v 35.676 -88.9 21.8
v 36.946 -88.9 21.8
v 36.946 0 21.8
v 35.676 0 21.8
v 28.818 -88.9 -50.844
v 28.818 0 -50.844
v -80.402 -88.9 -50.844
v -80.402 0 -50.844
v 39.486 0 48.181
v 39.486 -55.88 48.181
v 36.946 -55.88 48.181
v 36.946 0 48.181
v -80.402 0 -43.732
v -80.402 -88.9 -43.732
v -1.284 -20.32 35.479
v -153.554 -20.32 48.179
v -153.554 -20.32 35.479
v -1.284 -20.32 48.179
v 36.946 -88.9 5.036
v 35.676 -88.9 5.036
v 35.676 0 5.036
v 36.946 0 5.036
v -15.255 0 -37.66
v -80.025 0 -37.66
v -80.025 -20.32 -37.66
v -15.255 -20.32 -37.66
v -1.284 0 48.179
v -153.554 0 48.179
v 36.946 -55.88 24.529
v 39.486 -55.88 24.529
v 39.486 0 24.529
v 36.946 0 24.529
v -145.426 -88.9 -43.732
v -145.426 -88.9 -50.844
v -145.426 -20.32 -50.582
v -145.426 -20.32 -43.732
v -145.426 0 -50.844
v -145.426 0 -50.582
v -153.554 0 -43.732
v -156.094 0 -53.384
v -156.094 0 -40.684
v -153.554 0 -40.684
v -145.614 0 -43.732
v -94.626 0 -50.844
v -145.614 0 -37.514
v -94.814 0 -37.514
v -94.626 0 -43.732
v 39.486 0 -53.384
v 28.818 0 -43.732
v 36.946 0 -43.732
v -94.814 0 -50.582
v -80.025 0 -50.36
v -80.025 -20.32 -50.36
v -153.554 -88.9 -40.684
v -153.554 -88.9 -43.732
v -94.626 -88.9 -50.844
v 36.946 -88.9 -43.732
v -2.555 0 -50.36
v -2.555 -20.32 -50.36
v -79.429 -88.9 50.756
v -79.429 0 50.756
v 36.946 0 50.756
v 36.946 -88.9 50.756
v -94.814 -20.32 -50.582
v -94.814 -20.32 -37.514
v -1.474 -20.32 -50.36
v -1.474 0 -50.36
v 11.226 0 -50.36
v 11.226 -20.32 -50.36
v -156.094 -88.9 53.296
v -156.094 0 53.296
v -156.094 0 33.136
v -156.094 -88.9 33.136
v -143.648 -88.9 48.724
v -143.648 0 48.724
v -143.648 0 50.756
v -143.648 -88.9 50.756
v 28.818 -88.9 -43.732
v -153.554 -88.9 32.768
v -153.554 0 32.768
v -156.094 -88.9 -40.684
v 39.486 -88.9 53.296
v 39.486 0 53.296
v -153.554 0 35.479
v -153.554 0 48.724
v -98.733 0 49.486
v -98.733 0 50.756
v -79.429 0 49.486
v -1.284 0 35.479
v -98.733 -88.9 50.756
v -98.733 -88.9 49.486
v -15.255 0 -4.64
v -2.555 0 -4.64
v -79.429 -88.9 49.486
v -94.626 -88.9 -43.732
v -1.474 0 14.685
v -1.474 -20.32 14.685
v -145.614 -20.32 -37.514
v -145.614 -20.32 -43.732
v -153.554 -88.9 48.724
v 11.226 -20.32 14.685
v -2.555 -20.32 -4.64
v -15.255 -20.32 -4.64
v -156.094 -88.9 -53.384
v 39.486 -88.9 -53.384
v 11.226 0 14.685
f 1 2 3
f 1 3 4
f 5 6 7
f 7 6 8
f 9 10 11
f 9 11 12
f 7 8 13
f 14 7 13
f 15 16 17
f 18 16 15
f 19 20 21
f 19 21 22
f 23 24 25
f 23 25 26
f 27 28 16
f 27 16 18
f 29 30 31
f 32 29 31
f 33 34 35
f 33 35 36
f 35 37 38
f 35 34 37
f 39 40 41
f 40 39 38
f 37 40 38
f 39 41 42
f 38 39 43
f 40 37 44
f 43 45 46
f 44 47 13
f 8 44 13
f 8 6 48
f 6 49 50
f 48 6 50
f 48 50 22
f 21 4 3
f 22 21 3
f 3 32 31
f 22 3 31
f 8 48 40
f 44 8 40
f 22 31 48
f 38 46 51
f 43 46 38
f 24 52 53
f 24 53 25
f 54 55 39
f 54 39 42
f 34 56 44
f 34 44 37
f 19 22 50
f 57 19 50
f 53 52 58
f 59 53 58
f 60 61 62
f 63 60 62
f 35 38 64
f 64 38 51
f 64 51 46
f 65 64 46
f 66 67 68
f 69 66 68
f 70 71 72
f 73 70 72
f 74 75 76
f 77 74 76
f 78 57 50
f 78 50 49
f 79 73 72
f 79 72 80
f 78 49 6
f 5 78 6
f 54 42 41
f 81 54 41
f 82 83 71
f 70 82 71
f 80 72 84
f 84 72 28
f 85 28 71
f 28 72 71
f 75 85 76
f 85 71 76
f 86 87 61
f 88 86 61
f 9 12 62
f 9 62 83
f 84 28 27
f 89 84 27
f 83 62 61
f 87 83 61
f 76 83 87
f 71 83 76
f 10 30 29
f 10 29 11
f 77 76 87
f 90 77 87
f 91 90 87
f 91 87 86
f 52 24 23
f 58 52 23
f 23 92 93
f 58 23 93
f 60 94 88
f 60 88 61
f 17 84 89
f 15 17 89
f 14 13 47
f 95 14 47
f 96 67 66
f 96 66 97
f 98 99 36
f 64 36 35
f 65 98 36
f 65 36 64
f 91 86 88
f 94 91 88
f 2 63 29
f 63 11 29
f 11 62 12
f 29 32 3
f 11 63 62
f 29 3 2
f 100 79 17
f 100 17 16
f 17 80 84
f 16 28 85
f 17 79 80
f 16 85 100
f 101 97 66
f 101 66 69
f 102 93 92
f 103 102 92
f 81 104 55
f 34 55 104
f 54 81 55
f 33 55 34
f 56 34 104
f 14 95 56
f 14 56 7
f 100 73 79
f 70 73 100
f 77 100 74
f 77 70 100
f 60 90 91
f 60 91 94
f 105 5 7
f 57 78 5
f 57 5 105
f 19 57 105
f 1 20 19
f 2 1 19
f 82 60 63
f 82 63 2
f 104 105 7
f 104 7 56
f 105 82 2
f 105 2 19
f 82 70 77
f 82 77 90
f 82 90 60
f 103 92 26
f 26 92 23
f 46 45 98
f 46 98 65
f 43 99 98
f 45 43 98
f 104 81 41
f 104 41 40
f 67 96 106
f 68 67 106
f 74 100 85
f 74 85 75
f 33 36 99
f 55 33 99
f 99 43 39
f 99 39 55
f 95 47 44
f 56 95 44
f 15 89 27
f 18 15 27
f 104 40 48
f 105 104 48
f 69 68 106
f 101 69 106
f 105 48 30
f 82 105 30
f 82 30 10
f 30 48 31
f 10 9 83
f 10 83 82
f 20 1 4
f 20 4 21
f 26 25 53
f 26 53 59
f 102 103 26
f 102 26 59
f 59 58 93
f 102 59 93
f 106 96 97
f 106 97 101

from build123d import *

# Parameters (mm, degrees)
F1_DEPTH = 88.9
F2_W     = 55.88
F2_H     = 23.652589
F3_DEPTH = 25.4
F5_W     = 152.4
F5_H     = 12.7
F4_W     = 50.8
F4_H     = 13.067906
F6_W     = 64.770278
F6_H     = 12.7
F7_W     = 12.7
F7_H     = 65.045893
F8_DEPTH = 20.32


with BuildPart() as f1:
    # F0 (on Front) → F1 (new body)
    with BuildSketch(Plane.XZ):
        Polygon((-143.647713, 48.72386), (-143.647713, 50.75586), (-98.733298, 50.75586), (-98.733298, 49.48586), (-79.429298, 49.48586), (-79.429298, 50.75586), (36.946287, 50.75586), (36.946287, 21.79986), (35.676287, 21.79986), (35.676287, 5.03586), (36.946287, 5.03586), (36.946287, -43.73214), (28.818287, -43.73214), (28.818287, -50.84414), (-80.401713, -50.84414), (-80.401713, -43.73214), (-94.625713, -43.73214), (-94.625713, -50.84414), (-145.425713, -50.84414), (-145.425713, -43.73214), (-153.553713, -43.73214), (-153.553713, -40.68414), (-156.093713, -40.68414), (-156.093713, -53.38414), (39.486287, -53.38414), (39.486287, -50.84414), (39.486287, 53.29586), (-156.093713, 53.29586), (-156.093713, 33.135816), (-153.553713, 32.767907), (-153.553713, 48.72386), align=None)
    extrude(amount=F1_DEPTH)

    # F2 (on face) → F3 (cut)
    with BuildSketch(Plane.YZ.offset(39.486287)):
        with Locations((-27.94, 36.354907)):
            Rectangle(F2_W, F2_H)
    extrude(amount=-F3_DEPTH, mode=Mode.SUBTRACT)

    # F5 (on Front) + F4 (on Front) + F6 (on Front) + F7 (on Front) → F8 (join)
    with BuildSketch(Plane.XZ):
        with Locations((-77.483707, 41.82889)):
            Rectangle(F5_W, F5_H)
    with BuildSketch(Plane.XZ):
        with Locations((-120.213909, -44.048009)):
            Rectangle(F4_W, F4_H)
    with BuildSketch(Plane.XZ):
        with Locations((-47.639953, -44.010493)):
            Rectangle(F6_W, F6_H)
        Polygon((-15.254814, -37.660493), (-15.254814, -50.360493), (-2.554814, -50.360493), (-2.554814, -4.640493), (-15.254814, -4.640493), align=None)
    with BuildSketch(Plane.XZ):
        with Locations((4.876096, -17.837546)):
            Rectangle(F7_W, F7_H)
    extrude(amount=F8_DEPTH)


solid = f1.part
